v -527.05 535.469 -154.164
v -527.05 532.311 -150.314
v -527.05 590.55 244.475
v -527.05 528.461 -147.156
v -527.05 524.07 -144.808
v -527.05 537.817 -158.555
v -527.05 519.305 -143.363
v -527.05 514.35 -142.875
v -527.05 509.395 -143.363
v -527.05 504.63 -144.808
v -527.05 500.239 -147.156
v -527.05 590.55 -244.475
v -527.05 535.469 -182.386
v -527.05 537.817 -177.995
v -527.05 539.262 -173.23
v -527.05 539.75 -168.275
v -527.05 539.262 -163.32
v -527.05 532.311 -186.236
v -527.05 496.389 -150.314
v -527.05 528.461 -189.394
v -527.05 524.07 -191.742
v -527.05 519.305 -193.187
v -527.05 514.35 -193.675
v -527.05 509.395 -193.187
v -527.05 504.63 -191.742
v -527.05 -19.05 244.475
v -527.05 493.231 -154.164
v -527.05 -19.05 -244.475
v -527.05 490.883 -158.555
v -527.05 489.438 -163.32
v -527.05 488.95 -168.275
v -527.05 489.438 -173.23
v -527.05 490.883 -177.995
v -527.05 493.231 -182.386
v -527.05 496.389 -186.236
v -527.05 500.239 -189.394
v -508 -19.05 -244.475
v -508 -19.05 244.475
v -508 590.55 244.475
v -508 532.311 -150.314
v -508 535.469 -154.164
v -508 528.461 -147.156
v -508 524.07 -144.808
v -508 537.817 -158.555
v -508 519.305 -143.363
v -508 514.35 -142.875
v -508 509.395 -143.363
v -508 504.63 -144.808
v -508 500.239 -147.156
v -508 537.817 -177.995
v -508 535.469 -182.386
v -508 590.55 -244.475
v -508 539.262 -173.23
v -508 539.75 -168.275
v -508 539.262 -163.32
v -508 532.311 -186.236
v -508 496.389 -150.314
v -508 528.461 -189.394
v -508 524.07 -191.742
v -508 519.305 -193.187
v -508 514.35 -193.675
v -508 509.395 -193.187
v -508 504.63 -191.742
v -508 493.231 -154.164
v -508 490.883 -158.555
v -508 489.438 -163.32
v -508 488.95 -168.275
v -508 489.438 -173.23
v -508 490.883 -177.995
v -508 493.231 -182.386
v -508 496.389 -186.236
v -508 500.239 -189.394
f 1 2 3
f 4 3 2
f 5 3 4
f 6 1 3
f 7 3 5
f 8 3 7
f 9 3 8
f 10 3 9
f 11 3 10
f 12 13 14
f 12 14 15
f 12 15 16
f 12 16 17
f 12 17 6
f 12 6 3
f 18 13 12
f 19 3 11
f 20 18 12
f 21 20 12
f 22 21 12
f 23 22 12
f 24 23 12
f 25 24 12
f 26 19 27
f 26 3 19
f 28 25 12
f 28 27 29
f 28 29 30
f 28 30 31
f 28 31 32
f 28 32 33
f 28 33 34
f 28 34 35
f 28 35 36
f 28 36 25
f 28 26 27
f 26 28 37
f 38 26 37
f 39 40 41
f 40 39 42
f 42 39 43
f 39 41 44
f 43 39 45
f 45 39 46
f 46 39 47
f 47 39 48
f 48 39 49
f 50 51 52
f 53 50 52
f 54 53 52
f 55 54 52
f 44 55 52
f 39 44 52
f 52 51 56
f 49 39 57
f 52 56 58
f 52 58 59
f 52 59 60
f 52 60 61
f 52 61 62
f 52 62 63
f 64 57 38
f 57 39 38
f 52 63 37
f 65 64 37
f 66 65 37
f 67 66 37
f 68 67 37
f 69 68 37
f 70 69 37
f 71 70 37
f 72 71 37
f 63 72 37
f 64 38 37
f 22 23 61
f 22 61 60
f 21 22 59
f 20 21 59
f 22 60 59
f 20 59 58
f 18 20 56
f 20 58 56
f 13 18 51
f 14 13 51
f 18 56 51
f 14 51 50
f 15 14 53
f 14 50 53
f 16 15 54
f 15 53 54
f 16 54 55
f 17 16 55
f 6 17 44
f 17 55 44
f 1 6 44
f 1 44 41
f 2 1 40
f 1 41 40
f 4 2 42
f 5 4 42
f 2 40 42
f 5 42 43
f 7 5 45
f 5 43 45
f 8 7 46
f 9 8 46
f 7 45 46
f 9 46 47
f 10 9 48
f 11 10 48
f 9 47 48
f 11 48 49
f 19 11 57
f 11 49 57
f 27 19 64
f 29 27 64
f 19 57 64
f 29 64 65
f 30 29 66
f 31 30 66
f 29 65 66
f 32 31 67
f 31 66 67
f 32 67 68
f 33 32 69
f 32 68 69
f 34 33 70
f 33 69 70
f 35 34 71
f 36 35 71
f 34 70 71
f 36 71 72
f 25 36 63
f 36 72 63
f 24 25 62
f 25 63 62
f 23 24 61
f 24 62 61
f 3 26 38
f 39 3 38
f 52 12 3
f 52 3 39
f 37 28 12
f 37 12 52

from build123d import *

# Parameters (mm, degrees)
STOCK_BOXV2_1_START     = -19.05
STOCK_BOXV2_1_OUTLINE_W = 19.05
STOCK_BOXV2_1_OUTLINE_H = 488.95
STOCK_BOXV2_1_DEPTH     = 609.6
SKETCH1_R               = 25.4
CUT_EXTRUDE1_DEPTH      = 19.05


# Read off the part's stored shape, not the designer's step: Stock-boxV2-1
with BuildPart() as part:
    # Stock-boxV2-1 outline → Stock-boxV2-1 (new body)
    with BuildSketch(Plane(origin=(0, 0, 0), x_dir=(1, 0, 0), z_dir=(0, 1, 0)).offset(STOCK_BOXV2_1_START)):
        with Locations((-517.525, 0)):
            Rectangle(STOCK_BOXV2_1_OUTLINE_W, STOCK_BOXV2_1_OUTLINE_H)
    extrude(amount=STOCK_BOXV2_1_DEPTH)

    # Sketch1 → Cut-Extrude1 (cut)
    with BuildSketch(Plane(origin=(-508, 0, 0), x_dir=(0, 0, -1), z_dir=(1, 0, 0))):
        with Locations((168.275, 514.35)):
            Circle(SKETCH1_R)
    extrude(amount=-CUT_EXTRUDE1_DEPTH, mode=Mode.SUBTRACT)


solid = part.part
